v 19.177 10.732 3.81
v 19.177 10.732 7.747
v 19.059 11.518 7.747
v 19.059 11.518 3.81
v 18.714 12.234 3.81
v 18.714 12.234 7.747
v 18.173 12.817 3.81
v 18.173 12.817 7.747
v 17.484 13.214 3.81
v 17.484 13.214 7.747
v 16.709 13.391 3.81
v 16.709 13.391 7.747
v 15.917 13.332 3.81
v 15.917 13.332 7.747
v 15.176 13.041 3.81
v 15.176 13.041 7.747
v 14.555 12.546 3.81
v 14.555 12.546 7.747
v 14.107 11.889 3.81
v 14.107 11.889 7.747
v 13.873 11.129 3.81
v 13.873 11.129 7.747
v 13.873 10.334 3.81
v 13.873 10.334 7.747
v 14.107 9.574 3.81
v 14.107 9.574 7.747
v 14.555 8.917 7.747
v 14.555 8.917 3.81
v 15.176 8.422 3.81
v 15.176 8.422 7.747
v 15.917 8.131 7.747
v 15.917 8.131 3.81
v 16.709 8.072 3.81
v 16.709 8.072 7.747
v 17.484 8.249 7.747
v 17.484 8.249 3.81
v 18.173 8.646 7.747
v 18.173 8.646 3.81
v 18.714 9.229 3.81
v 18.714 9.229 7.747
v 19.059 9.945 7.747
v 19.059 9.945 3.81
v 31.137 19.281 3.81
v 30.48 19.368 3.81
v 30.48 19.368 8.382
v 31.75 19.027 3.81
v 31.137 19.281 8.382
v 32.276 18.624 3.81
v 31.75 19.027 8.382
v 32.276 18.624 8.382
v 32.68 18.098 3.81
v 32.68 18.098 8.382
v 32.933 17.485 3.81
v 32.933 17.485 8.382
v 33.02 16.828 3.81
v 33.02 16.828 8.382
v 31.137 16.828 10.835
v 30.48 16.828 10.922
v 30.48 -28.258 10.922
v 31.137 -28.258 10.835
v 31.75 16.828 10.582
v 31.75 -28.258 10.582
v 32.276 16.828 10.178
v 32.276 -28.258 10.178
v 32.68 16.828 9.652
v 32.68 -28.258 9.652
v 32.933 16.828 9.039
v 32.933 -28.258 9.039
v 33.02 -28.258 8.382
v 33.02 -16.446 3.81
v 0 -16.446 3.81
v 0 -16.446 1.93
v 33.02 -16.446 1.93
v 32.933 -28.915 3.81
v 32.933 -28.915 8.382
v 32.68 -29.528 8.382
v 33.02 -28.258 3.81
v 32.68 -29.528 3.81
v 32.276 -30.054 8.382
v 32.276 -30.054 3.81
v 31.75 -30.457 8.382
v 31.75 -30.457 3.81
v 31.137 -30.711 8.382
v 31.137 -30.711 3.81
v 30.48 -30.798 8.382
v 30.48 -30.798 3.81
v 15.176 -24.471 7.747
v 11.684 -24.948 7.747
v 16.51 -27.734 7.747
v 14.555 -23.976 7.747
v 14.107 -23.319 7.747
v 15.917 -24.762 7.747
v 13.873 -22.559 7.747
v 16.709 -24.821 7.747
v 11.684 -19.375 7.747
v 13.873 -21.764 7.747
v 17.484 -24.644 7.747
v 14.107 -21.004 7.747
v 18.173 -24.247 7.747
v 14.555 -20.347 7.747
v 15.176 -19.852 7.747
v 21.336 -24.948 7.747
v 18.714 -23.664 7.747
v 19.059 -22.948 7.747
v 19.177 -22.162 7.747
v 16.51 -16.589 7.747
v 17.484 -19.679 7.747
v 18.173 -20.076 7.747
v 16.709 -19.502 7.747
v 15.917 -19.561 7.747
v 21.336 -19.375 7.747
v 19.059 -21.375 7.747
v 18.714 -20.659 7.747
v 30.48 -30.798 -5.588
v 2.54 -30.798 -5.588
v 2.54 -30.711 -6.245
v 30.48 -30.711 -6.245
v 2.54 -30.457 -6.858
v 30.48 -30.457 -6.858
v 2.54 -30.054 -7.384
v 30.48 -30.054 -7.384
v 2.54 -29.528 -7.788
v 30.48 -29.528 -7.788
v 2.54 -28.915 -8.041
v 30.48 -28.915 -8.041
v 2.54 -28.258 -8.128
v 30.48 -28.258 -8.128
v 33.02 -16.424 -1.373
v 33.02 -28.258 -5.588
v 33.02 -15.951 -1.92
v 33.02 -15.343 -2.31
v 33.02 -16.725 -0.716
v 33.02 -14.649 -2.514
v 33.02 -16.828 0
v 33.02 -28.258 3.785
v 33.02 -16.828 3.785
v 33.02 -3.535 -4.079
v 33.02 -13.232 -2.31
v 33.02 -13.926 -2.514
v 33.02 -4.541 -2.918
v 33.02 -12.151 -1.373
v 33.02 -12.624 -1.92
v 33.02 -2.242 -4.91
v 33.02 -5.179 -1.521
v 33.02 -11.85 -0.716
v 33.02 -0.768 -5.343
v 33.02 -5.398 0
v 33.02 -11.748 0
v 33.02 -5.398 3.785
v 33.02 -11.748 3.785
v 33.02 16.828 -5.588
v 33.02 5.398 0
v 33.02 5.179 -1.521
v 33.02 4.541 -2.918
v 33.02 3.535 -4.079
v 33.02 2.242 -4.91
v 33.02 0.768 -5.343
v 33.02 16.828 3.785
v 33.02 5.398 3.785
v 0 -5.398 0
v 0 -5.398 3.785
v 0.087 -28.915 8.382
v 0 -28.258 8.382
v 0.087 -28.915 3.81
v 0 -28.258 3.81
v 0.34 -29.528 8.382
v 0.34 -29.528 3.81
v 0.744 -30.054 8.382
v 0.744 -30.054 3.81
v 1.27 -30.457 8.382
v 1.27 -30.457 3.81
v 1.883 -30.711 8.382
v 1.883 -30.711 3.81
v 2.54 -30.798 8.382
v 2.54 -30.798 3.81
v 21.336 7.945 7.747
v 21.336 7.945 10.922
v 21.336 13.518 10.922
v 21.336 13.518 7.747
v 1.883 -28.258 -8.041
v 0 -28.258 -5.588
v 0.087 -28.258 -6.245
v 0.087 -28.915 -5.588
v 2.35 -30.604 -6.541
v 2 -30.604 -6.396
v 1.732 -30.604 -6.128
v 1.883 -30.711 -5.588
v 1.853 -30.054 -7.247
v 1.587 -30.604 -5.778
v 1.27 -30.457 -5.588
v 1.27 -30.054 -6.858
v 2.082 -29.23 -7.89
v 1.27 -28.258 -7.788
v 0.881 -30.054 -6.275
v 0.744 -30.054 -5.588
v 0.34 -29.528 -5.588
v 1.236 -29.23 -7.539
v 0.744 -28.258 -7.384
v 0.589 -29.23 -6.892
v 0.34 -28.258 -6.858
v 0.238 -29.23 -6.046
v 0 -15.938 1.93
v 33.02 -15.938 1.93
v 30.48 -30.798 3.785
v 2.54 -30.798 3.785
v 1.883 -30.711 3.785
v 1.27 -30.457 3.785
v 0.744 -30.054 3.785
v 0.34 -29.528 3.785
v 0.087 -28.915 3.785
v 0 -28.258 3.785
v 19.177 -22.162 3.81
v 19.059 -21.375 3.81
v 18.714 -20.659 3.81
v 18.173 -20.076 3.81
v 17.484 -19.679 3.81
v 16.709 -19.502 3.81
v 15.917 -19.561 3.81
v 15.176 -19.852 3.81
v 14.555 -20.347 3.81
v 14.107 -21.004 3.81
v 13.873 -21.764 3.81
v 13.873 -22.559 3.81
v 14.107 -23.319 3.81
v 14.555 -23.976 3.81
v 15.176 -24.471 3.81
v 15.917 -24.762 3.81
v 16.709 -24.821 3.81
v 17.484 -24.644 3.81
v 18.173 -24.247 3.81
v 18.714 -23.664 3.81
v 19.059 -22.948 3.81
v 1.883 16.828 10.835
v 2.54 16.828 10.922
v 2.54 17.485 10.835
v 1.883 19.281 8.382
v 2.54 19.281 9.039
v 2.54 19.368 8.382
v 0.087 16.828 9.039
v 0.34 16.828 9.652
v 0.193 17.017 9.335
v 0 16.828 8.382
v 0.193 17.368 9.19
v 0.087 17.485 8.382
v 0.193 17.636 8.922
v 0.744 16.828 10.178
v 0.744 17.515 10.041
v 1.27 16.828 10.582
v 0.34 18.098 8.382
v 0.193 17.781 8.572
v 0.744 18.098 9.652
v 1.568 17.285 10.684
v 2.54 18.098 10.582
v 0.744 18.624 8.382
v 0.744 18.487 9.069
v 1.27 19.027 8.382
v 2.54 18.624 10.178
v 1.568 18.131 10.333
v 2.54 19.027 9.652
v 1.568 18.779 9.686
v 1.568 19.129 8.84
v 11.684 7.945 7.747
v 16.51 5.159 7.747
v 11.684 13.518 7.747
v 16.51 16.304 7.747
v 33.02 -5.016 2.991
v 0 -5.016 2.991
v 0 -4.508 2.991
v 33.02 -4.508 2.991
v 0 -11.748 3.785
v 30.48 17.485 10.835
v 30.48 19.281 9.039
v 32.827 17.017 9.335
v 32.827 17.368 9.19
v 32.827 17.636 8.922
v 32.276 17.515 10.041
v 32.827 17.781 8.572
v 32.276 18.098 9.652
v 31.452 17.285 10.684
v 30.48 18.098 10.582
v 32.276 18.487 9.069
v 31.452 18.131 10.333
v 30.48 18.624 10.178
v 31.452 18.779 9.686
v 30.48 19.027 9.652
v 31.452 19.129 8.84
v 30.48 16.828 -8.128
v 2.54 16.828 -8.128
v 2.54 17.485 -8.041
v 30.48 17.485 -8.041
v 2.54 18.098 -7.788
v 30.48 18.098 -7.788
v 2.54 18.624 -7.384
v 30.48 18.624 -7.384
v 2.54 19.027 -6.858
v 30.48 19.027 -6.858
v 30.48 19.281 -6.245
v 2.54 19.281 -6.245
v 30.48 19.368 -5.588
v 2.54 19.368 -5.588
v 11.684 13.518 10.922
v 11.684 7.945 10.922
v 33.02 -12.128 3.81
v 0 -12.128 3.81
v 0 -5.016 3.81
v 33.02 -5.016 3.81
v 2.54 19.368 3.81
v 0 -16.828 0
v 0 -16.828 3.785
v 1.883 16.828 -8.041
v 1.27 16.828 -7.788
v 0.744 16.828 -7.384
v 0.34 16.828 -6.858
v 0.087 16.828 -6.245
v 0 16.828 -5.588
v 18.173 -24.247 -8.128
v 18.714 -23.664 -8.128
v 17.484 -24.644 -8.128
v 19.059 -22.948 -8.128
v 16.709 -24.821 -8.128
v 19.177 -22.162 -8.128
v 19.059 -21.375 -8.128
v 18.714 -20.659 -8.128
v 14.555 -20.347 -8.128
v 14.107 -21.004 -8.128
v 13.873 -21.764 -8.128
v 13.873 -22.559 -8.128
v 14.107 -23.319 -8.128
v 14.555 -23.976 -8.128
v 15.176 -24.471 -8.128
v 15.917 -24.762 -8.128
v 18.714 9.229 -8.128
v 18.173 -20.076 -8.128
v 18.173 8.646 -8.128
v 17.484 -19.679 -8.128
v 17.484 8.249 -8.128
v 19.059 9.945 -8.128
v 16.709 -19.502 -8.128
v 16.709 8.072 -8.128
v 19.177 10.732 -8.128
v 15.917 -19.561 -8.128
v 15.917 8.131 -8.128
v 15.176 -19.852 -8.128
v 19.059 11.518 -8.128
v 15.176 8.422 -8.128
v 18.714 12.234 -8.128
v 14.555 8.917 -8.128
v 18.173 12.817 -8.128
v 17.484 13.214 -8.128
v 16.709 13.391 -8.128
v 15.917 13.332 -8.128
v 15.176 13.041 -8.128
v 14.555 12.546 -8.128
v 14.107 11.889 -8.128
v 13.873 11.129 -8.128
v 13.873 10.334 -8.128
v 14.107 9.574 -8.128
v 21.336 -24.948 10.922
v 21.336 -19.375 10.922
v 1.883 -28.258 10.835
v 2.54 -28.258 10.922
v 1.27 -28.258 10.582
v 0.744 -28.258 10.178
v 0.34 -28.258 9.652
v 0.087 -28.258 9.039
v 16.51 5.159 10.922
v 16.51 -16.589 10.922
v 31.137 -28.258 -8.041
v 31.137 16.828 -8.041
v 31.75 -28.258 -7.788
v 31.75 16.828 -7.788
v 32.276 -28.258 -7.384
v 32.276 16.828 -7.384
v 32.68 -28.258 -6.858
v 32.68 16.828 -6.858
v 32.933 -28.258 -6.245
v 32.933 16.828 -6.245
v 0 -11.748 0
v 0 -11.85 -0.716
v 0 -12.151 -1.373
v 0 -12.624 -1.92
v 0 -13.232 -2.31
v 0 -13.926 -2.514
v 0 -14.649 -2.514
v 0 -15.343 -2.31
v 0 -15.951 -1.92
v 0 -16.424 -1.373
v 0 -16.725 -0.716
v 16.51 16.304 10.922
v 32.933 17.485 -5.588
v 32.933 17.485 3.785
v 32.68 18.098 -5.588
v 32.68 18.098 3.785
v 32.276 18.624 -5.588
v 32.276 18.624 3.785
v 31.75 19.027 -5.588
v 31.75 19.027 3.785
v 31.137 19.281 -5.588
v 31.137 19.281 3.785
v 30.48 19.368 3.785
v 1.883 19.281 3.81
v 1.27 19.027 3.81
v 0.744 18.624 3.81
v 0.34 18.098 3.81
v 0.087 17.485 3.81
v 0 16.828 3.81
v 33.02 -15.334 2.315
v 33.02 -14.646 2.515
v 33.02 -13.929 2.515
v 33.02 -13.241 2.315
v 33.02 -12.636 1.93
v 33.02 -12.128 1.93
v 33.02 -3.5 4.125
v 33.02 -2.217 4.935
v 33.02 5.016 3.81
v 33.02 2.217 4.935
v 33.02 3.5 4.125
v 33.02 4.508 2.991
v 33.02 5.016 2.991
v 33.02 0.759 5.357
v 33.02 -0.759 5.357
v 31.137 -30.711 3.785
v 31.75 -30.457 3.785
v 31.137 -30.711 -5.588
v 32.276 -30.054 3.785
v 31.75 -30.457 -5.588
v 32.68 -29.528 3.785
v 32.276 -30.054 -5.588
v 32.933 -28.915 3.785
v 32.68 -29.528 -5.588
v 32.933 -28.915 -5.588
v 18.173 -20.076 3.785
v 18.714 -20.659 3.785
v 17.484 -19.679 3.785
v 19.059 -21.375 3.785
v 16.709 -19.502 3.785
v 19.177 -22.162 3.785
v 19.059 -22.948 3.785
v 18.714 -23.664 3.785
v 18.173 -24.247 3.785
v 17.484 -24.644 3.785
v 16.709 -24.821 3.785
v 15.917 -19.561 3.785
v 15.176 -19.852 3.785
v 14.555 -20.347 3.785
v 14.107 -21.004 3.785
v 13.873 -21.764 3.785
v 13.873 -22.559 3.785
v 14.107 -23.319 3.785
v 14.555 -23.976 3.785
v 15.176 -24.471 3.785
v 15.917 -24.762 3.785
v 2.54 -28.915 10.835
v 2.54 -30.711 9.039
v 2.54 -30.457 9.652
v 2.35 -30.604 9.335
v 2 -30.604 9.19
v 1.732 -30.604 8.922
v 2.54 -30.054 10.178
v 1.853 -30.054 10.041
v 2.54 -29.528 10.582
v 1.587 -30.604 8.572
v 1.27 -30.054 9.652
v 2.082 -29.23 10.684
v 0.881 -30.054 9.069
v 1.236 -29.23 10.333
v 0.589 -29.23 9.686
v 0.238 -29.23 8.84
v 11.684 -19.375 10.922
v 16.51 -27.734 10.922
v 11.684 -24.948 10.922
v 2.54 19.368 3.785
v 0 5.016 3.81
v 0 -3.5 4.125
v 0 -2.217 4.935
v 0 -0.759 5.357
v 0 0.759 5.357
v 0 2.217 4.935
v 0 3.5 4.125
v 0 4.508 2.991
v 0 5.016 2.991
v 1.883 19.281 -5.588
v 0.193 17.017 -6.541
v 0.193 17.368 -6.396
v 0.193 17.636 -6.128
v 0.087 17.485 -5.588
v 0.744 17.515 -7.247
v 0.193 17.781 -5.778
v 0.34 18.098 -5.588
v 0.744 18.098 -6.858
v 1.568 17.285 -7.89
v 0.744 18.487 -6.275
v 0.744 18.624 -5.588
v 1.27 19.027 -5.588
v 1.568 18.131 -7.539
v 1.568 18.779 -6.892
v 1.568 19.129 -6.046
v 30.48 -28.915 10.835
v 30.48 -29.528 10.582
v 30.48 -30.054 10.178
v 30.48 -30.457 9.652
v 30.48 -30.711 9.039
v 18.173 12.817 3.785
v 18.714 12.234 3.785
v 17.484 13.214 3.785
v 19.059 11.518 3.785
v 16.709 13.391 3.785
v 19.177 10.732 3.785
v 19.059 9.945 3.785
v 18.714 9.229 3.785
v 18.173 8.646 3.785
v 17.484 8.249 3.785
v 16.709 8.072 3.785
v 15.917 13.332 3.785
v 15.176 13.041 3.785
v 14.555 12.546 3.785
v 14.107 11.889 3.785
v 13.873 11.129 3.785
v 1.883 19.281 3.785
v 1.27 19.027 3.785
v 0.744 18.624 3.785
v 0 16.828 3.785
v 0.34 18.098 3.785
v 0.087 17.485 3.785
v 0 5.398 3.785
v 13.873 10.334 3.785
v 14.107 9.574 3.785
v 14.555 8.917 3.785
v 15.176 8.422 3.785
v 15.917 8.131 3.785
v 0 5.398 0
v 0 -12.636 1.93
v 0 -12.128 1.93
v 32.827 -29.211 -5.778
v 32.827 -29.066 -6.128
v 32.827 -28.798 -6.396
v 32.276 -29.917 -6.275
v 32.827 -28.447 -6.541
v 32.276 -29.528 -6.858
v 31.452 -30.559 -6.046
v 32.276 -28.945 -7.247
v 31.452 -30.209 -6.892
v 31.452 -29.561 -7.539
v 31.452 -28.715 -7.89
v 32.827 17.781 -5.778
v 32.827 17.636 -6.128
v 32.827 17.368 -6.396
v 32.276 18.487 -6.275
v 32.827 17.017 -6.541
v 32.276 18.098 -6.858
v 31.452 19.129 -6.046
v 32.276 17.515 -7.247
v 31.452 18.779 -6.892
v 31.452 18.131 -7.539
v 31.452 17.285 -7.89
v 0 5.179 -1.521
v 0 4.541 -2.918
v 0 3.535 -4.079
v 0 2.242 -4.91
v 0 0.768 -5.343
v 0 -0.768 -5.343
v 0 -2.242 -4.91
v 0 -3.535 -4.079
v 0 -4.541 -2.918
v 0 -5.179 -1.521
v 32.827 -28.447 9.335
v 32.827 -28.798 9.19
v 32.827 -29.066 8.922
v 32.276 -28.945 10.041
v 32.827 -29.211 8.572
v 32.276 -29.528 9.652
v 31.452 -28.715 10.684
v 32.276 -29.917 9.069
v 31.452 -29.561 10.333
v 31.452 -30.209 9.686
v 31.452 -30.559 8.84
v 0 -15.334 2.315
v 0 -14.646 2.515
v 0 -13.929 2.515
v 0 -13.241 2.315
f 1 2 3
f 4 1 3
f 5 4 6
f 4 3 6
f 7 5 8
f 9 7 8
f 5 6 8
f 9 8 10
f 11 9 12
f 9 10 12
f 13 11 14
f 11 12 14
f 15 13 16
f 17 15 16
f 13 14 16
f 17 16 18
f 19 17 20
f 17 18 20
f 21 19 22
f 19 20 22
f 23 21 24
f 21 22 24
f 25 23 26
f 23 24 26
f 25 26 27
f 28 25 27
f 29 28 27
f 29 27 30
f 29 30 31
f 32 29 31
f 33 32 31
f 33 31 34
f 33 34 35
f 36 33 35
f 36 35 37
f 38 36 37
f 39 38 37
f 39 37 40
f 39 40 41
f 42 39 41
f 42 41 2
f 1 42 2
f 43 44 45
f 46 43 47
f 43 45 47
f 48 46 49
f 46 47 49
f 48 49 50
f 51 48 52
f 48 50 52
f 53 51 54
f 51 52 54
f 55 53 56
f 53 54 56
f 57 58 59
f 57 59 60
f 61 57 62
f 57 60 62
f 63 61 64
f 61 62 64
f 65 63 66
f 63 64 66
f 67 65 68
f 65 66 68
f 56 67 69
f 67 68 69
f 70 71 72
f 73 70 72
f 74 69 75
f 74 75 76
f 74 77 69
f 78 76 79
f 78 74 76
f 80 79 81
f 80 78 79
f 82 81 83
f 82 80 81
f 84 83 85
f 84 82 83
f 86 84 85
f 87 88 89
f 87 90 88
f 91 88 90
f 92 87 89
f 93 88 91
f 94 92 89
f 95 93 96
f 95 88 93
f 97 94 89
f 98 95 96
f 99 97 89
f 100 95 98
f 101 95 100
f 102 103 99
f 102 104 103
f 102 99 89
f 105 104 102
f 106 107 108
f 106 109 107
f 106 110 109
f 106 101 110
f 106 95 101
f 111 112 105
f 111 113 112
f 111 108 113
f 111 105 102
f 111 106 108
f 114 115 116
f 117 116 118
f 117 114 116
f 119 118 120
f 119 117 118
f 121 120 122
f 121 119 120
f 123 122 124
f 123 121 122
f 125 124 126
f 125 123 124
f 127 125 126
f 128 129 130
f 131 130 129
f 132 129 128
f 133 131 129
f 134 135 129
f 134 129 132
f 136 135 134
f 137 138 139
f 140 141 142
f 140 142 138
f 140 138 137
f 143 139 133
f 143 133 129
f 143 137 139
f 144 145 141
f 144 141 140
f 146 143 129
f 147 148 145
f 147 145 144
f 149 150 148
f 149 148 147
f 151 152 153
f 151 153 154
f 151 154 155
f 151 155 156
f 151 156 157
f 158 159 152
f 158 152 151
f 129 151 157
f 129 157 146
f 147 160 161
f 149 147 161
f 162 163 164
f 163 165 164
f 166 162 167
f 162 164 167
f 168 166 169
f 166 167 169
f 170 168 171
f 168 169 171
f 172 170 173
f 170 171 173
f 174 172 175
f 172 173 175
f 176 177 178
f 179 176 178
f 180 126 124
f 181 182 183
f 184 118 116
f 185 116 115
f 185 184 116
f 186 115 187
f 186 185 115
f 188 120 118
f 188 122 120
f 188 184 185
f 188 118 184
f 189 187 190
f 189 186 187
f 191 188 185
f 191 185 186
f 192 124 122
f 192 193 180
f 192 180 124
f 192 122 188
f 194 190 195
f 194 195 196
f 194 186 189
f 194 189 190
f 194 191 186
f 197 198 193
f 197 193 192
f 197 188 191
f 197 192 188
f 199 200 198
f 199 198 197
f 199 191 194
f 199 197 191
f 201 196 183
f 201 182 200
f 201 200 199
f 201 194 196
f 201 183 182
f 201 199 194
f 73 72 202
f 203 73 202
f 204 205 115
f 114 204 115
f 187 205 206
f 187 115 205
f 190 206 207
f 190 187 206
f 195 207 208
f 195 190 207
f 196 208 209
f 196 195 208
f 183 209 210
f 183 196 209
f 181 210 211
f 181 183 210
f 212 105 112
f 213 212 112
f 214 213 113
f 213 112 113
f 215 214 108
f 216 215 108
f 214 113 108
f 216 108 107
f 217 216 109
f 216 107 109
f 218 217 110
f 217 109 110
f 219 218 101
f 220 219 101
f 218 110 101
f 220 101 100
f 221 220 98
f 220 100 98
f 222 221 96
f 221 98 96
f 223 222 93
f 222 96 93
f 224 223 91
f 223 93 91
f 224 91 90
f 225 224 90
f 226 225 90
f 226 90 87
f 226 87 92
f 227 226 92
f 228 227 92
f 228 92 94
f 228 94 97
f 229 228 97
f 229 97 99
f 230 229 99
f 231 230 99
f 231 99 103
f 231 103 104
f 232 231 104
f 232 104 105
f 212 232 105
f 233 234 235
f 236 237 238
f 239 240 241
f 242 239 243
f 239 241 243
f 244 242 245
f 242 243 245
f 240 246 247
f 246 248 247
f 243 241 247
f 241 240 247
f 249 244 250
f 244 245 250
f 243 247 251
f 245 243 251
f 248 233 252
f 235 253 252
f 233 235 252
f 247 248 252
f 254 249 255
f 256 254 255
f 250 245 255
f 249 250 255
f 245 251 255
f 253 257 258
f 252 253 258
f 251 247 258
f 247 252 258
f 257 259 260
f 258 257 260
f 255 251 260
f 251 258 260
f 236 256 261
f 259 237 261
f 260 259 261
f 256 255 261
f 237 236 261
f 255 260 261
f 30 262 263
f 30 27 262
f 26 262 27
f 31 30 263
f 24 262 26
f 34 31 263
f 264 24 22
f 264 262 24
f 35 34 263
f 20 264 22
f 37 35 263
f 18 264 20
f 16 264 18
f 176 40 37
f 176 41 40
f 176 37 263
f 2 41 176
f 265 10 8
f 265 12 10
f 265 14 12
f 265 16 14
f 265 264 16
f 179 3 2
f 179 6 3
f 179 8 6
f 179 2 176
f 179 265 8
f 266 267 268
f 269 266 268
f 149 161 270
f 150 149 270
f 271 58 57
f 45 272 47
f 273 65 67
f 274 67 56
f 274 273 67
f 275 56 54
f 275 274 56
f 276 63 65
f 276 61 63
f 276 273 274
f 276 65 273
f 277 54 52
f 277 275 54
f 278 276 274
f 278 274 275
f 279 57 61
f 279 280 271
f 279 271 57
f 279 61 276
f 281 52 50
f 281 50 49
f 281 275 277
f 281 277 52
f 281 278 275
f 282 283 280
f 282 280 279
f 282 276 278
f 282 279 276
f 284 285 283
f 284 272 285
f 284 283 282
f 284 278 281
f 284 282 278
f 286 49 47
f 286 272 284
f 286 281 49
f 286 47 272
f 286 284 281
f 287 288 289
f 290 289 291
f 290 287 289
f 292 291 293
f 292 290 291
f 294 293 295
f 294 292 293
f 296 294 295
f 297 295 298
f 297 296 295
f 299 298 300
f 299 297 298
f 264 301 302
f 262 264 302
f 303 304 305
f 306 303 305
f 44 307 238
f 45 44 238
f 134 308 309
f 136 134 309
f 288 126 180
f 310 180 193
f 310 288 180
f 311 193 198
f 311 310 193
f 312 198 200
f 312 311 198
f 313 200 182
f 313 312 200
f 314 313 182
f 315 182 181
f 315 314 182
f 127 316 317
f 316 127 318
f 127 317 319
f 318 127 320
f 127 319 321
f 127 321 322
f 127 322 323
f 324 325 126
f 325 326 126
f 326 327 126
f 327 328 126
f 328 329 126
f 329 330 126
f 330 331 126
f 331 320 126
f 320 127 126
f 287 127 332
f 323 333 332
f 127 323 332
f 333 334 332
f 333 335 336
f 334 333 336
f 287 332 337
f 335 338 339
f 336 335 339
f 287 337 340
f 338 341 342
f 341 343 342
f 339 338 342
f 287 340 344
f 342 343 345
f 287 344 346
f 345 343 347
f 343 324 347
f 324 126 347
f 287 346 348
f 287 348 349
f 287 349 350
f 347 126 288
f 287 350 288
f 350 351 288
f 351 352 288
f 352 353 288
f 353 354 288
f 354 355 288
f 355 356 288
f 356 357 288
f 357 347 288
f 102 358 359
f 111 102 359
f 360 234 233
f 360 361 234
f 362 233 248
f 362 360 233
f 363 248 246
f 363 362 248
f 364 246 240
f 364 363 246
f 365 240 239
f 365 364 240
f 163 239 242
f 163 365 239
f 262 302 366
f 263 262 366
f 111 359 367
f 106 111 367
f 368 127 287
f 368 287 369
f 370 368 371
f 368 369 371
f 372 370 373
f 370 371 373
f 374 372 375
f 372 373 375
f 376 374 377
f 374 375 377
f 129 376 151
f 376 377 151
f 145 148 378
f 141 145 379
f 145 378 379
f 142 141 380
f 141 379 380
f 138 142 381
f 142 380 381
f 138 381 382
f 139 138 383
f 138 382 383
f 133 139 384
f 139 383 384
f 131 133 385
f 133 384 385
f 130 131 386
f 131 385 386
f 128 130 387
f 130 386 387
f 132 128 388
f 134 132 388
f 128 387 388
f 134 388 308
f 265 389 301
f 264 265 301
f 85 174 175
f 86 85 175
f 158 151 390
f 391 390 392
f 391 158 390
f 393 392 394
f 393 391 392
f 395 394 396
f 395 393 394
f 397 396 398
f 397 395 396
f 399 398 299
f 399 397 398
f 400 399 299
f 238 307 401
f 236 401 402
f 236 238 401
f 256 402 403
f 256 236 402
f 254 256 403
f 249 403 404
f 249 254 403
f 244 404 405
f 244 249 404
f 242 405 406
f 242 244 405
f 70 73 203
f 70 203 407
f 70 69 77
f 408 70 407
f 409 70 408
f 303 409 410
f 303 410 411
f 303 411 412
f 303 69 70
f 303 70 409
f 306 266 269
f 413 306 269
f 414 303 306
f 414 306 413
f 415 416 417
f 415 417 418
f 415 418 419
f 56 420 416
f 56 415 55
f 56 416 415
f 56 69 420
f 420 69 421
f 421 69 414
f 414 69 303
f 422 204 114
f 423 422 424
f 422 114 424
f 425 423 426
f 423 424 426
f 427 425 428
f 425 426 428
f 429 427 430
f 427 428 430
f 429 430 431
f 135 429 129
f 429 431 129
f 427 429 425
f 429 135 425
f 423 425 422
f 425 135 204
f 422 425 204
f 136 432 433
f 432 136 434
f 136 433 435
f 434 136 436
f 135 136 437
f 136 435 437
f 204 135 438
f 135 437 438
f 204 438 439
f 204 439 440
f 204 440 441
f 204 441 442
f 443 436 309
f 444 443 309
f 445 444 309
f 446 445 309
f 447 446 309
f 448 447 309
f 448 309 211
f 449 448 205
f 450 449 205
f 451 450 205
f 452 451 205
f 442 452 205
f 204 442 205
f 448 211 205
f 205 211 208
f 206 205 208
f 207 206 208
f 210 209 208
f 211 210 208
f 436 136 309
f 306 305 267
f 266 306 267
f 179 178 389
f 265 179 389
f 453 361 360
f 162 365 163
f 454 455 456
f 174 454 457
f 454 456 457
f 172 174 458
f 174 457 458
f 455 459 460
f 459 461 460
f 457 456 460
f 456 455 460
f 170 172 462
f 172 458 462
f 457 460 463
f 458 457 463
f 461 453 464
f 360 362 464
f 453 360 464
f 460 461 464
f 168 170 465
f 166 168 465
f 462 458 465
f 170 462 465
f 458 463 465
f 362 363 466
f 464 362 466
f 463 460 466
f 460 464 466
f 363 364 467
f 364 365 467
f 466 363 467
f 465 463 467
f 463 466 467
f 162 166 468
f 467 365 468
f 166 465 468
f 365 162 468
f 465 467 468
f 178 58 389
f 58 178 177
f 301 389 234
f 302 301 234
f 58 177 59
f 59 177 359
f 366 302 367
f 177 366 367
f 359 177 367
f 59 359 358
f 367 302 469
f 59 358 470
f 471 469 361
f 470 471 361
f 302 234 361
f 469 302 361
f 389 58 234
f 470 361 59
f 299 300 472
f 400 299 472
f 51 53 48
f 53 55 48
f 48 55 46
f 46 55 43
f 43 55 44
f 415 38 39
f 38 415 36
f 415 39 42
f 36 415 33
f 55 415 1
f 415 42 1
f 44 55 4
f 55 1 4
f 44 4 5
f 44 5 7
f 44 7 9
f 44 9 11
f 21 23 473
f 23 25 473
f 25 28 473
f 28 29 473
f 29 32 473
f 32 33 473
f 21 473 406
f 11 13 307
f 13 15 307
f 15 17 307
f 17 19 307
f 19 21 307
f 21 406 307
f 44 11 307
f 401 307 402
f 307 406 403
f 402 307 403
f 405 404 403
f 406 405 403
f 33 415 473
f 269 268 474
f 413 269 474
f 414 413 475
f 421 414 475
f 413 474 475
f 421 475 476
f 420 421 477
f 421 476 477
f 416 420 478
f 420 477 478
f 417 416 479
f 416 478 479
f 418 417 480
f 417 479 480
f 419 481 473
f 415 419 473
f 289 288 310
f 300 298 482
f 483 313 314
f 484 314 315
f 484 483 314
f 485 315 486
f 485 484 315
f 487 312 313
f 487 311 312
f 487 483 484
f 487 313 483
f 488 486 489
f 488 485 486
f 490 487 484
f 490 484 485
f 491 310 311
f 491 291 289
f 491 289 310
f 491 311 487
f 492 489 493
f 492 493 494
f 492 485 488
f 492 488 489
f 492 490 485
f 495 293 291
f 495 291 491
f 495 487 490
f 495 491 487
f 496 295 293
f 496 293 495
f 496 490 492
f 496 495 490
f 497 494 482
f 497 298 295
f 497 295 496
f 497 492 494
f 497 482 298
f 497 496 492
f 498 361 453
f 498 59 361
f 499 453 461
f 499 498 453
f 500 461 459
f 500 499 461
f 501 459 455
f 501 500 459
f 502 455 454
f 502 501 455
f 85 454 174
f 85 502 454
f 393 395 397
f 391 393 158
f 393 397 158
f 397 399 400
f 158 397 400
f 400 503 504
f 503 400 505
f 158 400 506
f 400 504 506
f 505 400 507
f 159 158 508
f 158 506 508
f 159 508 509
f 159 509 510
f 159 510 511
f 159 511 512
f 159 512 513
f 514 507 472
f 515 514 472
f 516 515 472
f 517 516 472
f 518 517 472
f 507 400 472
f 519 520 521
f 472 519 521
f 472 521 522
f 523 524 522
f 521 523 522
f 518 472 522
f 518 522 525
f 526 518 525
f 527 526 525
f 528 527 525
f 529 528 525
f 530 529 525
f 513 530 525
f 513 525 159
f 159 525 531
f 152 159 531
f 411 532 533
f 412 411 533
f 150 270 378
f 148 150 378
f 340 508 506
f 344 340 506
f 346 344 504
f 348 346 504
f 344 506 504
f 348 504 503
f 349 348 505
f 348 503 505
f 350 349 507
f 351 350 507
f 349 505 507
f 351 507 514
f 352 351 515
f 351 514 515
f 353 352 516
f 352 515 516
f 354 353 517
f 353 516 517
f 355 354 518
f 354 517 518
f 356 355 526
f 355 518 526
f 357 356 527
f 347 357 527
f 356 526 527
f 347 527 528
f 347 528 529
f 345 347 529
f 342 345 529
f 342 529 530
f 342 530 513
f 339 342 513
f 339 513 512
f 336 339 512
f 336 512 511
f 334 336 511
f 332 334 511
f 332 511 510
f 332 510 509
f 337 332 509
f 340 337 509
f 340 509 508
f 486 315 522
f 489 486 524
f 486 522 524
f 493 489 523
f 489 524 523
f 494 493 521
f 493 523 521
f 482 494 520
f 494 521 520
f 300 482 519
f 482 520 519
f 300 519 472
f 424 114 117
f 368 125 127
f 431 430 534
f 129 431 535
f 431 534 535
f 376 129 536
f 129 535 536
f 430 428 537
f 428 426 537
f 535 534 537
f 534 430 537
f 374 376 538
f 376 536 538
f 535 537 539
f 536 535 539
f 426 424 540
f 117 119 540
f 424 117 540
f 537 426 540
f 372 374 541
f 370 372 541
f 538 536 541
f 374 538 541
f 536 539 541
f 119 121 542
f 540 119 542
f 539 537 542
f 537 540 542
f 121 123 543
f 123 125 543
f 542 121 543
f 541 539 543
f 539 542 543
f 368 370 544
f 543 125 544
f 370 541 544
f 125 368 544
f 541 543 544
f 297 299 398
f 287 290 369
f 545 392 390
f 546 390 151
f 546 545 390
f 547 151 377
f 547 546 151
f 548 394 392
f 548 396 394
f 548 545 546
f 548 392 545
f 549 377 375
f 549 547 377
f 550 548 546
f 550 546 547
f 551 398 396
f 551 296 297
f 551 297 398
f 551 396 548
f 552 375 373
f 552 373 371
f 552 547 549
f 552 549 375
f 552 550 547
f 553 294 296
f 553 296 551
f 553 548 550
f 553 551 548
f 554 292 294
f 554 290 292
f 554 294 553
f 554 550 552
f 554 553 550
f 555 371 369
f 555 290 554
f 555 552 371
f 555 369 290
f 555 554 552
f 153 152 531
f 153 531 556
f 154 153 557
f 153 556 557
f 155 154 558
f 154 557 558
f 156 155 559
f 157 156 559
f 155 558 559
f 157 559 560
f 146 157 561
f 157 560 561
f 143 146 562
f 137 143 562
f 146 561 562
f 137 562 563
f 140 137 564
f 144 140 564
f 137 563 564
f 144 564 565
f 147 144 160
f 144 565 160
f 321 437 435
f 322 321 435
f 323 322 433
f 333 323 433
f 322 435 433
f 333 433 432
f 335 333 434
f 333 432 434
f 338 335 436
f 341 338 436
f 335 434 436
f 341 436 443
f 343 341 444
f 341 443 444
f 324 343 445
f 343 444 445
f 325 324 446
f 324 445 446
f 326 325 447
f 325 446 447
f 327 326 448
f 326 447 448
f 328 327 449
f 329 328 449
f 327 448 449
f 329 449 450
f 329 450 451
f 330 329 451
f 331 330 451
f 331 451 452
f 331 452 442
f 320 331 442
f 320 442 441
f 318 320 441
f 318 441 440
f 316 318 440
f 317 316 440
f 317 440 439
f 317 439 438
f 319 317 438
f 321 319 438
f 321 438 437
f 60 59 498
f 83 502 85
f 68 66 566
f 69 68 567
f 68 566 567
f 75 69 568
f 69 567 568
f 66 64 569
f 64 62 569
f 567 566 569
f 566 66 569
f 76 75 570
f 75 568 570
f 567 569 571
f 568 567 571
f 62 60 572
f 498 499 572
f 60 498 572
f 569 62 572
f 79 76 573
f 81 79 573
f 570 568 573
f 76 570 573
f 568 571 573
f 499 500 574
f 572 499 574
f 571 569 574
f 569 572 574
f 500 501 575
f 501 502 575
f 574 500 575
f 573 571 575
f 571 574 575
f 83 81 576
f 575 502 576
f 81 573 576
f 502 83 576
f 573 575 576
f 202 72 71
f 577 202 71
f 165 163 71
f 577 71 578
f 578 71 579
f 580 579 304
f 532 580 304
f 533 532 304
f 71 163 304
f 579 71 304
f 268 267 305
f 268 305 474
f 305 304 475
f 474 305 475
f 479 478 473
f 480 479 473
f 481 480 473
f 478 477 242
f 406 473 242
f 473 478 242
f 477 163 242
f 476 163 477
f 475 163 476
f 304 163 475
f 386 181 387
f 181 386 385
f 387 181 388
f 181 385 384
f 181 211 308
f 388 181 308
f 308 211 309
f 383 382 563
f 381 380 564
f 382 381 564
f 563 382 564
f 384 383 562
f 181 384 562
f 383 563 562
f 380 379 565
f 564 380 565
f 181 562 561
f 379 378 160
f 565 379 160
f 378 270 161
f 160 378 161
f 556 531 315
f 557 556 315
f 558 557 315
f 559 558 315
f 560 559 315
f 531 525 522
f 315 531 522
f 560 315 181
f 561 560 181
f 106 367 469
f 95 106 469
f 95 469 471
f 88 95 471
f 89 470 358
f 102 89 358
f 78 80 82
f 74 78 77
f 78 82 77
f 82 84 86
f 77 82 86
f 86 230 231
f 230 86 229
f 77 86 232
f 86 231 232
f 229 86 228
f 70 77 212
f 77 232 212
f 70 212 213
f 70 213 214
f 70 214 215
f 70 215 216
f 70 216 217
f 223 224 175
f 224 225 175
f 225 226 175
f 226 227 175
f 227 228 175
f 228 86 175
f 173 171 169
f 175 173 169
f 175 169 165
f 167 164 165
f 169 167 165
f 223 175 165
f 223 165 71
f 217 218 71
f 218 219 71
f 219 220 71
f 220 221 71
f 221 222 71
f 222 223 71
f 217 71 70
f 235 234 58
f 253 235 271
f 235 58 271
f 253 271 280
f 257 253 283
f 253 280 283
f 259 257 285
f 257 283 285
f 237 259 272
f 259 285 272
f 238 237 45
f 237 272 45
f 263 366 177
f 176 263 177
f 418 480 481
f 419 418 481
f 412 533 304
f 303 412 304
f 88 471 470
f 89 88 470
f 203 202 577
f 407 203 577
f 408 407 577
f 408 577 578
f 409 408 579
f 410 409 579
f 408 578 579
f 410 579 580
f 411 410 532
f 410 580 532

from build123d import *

# Parameters (mm, degrees)
F1_DEPTH = 33.02
F2_R     = 2.667
F3_DEPTH = 25.4
F5_DEPTH = 3.175
F6_R     = 2.54
F6_2_R   = 2.54


with BuildPart() as f1:
    # F0 (on Right) → F1 (new body)
    with BuildSketch(Plane.YZ):
        with BuildLine():
            Line((19.3675, 10.922), (0, 10.922))
            Line((0, 10.922), (-30.7975, 10.922))
            Line((-30.7975, 10.922), (-30.7975, 3.81))
            Line((-30.7975, 3.81), (-16.4465, 3.81))
            Line((-16.4465, 3.81), (-16.4465, 1.9302328875))
            Line((-16.4465, 1.9302328875), (-15.9385, 1.9302328875))
            ThreePointArc((-15.9385, 1.9302328875), (-14.2875, 2.54), (-12.6365, 1.9302328875))
            Line((-12.6365, 1.9302328875), (-12.1285, 1.9302328875))
            Line((-12.1285, 1.9302328875), (-12.1285, 3.81))
            Line((-12.1285, 3.81), (-5.0165, 3.81))
            Line((-5.0165, 3.81), (-5.0165, 2.9906005735))
            Line((-5.0165, 2.9906005735), (-4.5085, 2.9906005735))
            ThreePointArc((-4.5085, 2.9906005735), (0, 5.4102), (4.5085, 2.9906005735))
            Line((4.5085, 2.9906005735), (5.0165, 2.9906005735))
            Line((5.0165, 2.9906005735), (5.0165, 3.81))
            Line((5.0165, 3.81), (19.3675, 3.81))
            Line((19.3675, 3.81), (19.3675, 10.922))
        make_face()
    extrude(amount=F1_DEPTH)


with BuildPart() as f1b:
    # F0 (on Right) → F1, piece 2 (new body)
    with BuildSketch(Plane.YZ):
        with BuildLine():
            Line((-30.7975, 3.7846), (-30.7975, -8.128))
            Line((-30.7975, -8.128), (0, -8.128))
            Line((0, -8.128), (19.3675, -8.128))
            Line((19.3675, -8.128), (19.3675, 3.7846))
            Line((19.3675, 3.7846), (5.3975, 3.7846))
            Line((5.3975, 3.7846), (5.3975, 0))
            ThreePointArc((5.3975, 0), (0, -5.3975), (-5.3975, 0))
            Line((-5.3975, 0), (-5.3975, 3.7846))
            Line((-5.3975, 3.7846), (-11.7475, 3.7846))
            Line((-11.7475, 3.7846), (-11.7475, 0))
            ThreePointArc((-11.7475, 0), (-14.2875, -2.54), (-16.8275, 0))
            Line((-16.8275, 0), (-16.8275, 3.7846))
            Line((-16.8275, 3.7846), (-30.7975, 3.7846))
        make_face()
    extrude(amount=F1_DEPTH)


with BuildPart() as f3_tool:
    # F2 (on face) → F3 (new body)
    with BuildSketch(Plane.XY.offset(10.922)):
        with Locations((16.51, -22.1615)):
            Circle(F2_R)
        with Locations((16.51, 10.7315)):
            Circle(F2_R)
    extrude(amount=-F3_DEPTH)


with BuildPart() as f1_1:
    add(f1.part)

    # F3: cut by f3_tool
    add(f3_tool.part, mode=Mode.SUBTRACT)

    # F4 (on face) → F5 (cut)
    with BuildSketch(Plane.XY.offset(10.922)):
        Polygon((21.336, -24.9477923991), (21.336, -19.3752076009), (16.51, -16.5889152018), (11.684, -19.3752076009), (11.684, -24.9477923991), (16.51, -27.7340847982), align=None)
        Polygon((21.336, 13.5177923991), (16.51, 16.3040847982), (11.684, 13.5177923991), (11.684, 7.9452076009), (16.51, 5.1589152018), (21.336, 7.9452076009), align=None)
    extrude(amount=-F5_DEPTH, mode=Mode.SUBTRACT)

    # F6#2
    f6_2_edges = [f1_1.edges().sort_by_distance(p)[0] for p in [
        (16.51, 19.3675, 10.922),
        (0, -5.715, 10.922),
        (16.51, -30.7975, 10.922),
        (33.02, -5.715, 10.922),
        (33.02, 19.3675, 7.366),
        (0, 19.3675, 7.366),
        (0, -30.7975, 7.366),
        (33.02, -30.7975, 7.366),
    ]]
    fillet(f6_2_edges, radius=F6_2_R)


with BuildPart() as f1b_1:
    add(f1b.part)

    # F3: cut by f3_tool
    add(f3_tool.part, mode=Mode.SUBTRACT)

    # F6
    f6_edges = [f1b_1.edges().sort_by_distance(p)[0] for p in [
        (16.51, 19.3675, -8.128),
        (0, -5.715, -8.128),
        (16.51, -30.7975, -8.128),
        (33.02, -30.7975, -2.1717),
        (0, -30.7975, -2.1717),
        (33.02, 19.3675, -2.1717),
        (0, 19.3675, -2.1717),
        (33.02, -5.715, -8.128),
    ]]
    fillet(f6_edges, radius=F6_R)


solid = Compound([f1_1.part, f1b_1.part])
